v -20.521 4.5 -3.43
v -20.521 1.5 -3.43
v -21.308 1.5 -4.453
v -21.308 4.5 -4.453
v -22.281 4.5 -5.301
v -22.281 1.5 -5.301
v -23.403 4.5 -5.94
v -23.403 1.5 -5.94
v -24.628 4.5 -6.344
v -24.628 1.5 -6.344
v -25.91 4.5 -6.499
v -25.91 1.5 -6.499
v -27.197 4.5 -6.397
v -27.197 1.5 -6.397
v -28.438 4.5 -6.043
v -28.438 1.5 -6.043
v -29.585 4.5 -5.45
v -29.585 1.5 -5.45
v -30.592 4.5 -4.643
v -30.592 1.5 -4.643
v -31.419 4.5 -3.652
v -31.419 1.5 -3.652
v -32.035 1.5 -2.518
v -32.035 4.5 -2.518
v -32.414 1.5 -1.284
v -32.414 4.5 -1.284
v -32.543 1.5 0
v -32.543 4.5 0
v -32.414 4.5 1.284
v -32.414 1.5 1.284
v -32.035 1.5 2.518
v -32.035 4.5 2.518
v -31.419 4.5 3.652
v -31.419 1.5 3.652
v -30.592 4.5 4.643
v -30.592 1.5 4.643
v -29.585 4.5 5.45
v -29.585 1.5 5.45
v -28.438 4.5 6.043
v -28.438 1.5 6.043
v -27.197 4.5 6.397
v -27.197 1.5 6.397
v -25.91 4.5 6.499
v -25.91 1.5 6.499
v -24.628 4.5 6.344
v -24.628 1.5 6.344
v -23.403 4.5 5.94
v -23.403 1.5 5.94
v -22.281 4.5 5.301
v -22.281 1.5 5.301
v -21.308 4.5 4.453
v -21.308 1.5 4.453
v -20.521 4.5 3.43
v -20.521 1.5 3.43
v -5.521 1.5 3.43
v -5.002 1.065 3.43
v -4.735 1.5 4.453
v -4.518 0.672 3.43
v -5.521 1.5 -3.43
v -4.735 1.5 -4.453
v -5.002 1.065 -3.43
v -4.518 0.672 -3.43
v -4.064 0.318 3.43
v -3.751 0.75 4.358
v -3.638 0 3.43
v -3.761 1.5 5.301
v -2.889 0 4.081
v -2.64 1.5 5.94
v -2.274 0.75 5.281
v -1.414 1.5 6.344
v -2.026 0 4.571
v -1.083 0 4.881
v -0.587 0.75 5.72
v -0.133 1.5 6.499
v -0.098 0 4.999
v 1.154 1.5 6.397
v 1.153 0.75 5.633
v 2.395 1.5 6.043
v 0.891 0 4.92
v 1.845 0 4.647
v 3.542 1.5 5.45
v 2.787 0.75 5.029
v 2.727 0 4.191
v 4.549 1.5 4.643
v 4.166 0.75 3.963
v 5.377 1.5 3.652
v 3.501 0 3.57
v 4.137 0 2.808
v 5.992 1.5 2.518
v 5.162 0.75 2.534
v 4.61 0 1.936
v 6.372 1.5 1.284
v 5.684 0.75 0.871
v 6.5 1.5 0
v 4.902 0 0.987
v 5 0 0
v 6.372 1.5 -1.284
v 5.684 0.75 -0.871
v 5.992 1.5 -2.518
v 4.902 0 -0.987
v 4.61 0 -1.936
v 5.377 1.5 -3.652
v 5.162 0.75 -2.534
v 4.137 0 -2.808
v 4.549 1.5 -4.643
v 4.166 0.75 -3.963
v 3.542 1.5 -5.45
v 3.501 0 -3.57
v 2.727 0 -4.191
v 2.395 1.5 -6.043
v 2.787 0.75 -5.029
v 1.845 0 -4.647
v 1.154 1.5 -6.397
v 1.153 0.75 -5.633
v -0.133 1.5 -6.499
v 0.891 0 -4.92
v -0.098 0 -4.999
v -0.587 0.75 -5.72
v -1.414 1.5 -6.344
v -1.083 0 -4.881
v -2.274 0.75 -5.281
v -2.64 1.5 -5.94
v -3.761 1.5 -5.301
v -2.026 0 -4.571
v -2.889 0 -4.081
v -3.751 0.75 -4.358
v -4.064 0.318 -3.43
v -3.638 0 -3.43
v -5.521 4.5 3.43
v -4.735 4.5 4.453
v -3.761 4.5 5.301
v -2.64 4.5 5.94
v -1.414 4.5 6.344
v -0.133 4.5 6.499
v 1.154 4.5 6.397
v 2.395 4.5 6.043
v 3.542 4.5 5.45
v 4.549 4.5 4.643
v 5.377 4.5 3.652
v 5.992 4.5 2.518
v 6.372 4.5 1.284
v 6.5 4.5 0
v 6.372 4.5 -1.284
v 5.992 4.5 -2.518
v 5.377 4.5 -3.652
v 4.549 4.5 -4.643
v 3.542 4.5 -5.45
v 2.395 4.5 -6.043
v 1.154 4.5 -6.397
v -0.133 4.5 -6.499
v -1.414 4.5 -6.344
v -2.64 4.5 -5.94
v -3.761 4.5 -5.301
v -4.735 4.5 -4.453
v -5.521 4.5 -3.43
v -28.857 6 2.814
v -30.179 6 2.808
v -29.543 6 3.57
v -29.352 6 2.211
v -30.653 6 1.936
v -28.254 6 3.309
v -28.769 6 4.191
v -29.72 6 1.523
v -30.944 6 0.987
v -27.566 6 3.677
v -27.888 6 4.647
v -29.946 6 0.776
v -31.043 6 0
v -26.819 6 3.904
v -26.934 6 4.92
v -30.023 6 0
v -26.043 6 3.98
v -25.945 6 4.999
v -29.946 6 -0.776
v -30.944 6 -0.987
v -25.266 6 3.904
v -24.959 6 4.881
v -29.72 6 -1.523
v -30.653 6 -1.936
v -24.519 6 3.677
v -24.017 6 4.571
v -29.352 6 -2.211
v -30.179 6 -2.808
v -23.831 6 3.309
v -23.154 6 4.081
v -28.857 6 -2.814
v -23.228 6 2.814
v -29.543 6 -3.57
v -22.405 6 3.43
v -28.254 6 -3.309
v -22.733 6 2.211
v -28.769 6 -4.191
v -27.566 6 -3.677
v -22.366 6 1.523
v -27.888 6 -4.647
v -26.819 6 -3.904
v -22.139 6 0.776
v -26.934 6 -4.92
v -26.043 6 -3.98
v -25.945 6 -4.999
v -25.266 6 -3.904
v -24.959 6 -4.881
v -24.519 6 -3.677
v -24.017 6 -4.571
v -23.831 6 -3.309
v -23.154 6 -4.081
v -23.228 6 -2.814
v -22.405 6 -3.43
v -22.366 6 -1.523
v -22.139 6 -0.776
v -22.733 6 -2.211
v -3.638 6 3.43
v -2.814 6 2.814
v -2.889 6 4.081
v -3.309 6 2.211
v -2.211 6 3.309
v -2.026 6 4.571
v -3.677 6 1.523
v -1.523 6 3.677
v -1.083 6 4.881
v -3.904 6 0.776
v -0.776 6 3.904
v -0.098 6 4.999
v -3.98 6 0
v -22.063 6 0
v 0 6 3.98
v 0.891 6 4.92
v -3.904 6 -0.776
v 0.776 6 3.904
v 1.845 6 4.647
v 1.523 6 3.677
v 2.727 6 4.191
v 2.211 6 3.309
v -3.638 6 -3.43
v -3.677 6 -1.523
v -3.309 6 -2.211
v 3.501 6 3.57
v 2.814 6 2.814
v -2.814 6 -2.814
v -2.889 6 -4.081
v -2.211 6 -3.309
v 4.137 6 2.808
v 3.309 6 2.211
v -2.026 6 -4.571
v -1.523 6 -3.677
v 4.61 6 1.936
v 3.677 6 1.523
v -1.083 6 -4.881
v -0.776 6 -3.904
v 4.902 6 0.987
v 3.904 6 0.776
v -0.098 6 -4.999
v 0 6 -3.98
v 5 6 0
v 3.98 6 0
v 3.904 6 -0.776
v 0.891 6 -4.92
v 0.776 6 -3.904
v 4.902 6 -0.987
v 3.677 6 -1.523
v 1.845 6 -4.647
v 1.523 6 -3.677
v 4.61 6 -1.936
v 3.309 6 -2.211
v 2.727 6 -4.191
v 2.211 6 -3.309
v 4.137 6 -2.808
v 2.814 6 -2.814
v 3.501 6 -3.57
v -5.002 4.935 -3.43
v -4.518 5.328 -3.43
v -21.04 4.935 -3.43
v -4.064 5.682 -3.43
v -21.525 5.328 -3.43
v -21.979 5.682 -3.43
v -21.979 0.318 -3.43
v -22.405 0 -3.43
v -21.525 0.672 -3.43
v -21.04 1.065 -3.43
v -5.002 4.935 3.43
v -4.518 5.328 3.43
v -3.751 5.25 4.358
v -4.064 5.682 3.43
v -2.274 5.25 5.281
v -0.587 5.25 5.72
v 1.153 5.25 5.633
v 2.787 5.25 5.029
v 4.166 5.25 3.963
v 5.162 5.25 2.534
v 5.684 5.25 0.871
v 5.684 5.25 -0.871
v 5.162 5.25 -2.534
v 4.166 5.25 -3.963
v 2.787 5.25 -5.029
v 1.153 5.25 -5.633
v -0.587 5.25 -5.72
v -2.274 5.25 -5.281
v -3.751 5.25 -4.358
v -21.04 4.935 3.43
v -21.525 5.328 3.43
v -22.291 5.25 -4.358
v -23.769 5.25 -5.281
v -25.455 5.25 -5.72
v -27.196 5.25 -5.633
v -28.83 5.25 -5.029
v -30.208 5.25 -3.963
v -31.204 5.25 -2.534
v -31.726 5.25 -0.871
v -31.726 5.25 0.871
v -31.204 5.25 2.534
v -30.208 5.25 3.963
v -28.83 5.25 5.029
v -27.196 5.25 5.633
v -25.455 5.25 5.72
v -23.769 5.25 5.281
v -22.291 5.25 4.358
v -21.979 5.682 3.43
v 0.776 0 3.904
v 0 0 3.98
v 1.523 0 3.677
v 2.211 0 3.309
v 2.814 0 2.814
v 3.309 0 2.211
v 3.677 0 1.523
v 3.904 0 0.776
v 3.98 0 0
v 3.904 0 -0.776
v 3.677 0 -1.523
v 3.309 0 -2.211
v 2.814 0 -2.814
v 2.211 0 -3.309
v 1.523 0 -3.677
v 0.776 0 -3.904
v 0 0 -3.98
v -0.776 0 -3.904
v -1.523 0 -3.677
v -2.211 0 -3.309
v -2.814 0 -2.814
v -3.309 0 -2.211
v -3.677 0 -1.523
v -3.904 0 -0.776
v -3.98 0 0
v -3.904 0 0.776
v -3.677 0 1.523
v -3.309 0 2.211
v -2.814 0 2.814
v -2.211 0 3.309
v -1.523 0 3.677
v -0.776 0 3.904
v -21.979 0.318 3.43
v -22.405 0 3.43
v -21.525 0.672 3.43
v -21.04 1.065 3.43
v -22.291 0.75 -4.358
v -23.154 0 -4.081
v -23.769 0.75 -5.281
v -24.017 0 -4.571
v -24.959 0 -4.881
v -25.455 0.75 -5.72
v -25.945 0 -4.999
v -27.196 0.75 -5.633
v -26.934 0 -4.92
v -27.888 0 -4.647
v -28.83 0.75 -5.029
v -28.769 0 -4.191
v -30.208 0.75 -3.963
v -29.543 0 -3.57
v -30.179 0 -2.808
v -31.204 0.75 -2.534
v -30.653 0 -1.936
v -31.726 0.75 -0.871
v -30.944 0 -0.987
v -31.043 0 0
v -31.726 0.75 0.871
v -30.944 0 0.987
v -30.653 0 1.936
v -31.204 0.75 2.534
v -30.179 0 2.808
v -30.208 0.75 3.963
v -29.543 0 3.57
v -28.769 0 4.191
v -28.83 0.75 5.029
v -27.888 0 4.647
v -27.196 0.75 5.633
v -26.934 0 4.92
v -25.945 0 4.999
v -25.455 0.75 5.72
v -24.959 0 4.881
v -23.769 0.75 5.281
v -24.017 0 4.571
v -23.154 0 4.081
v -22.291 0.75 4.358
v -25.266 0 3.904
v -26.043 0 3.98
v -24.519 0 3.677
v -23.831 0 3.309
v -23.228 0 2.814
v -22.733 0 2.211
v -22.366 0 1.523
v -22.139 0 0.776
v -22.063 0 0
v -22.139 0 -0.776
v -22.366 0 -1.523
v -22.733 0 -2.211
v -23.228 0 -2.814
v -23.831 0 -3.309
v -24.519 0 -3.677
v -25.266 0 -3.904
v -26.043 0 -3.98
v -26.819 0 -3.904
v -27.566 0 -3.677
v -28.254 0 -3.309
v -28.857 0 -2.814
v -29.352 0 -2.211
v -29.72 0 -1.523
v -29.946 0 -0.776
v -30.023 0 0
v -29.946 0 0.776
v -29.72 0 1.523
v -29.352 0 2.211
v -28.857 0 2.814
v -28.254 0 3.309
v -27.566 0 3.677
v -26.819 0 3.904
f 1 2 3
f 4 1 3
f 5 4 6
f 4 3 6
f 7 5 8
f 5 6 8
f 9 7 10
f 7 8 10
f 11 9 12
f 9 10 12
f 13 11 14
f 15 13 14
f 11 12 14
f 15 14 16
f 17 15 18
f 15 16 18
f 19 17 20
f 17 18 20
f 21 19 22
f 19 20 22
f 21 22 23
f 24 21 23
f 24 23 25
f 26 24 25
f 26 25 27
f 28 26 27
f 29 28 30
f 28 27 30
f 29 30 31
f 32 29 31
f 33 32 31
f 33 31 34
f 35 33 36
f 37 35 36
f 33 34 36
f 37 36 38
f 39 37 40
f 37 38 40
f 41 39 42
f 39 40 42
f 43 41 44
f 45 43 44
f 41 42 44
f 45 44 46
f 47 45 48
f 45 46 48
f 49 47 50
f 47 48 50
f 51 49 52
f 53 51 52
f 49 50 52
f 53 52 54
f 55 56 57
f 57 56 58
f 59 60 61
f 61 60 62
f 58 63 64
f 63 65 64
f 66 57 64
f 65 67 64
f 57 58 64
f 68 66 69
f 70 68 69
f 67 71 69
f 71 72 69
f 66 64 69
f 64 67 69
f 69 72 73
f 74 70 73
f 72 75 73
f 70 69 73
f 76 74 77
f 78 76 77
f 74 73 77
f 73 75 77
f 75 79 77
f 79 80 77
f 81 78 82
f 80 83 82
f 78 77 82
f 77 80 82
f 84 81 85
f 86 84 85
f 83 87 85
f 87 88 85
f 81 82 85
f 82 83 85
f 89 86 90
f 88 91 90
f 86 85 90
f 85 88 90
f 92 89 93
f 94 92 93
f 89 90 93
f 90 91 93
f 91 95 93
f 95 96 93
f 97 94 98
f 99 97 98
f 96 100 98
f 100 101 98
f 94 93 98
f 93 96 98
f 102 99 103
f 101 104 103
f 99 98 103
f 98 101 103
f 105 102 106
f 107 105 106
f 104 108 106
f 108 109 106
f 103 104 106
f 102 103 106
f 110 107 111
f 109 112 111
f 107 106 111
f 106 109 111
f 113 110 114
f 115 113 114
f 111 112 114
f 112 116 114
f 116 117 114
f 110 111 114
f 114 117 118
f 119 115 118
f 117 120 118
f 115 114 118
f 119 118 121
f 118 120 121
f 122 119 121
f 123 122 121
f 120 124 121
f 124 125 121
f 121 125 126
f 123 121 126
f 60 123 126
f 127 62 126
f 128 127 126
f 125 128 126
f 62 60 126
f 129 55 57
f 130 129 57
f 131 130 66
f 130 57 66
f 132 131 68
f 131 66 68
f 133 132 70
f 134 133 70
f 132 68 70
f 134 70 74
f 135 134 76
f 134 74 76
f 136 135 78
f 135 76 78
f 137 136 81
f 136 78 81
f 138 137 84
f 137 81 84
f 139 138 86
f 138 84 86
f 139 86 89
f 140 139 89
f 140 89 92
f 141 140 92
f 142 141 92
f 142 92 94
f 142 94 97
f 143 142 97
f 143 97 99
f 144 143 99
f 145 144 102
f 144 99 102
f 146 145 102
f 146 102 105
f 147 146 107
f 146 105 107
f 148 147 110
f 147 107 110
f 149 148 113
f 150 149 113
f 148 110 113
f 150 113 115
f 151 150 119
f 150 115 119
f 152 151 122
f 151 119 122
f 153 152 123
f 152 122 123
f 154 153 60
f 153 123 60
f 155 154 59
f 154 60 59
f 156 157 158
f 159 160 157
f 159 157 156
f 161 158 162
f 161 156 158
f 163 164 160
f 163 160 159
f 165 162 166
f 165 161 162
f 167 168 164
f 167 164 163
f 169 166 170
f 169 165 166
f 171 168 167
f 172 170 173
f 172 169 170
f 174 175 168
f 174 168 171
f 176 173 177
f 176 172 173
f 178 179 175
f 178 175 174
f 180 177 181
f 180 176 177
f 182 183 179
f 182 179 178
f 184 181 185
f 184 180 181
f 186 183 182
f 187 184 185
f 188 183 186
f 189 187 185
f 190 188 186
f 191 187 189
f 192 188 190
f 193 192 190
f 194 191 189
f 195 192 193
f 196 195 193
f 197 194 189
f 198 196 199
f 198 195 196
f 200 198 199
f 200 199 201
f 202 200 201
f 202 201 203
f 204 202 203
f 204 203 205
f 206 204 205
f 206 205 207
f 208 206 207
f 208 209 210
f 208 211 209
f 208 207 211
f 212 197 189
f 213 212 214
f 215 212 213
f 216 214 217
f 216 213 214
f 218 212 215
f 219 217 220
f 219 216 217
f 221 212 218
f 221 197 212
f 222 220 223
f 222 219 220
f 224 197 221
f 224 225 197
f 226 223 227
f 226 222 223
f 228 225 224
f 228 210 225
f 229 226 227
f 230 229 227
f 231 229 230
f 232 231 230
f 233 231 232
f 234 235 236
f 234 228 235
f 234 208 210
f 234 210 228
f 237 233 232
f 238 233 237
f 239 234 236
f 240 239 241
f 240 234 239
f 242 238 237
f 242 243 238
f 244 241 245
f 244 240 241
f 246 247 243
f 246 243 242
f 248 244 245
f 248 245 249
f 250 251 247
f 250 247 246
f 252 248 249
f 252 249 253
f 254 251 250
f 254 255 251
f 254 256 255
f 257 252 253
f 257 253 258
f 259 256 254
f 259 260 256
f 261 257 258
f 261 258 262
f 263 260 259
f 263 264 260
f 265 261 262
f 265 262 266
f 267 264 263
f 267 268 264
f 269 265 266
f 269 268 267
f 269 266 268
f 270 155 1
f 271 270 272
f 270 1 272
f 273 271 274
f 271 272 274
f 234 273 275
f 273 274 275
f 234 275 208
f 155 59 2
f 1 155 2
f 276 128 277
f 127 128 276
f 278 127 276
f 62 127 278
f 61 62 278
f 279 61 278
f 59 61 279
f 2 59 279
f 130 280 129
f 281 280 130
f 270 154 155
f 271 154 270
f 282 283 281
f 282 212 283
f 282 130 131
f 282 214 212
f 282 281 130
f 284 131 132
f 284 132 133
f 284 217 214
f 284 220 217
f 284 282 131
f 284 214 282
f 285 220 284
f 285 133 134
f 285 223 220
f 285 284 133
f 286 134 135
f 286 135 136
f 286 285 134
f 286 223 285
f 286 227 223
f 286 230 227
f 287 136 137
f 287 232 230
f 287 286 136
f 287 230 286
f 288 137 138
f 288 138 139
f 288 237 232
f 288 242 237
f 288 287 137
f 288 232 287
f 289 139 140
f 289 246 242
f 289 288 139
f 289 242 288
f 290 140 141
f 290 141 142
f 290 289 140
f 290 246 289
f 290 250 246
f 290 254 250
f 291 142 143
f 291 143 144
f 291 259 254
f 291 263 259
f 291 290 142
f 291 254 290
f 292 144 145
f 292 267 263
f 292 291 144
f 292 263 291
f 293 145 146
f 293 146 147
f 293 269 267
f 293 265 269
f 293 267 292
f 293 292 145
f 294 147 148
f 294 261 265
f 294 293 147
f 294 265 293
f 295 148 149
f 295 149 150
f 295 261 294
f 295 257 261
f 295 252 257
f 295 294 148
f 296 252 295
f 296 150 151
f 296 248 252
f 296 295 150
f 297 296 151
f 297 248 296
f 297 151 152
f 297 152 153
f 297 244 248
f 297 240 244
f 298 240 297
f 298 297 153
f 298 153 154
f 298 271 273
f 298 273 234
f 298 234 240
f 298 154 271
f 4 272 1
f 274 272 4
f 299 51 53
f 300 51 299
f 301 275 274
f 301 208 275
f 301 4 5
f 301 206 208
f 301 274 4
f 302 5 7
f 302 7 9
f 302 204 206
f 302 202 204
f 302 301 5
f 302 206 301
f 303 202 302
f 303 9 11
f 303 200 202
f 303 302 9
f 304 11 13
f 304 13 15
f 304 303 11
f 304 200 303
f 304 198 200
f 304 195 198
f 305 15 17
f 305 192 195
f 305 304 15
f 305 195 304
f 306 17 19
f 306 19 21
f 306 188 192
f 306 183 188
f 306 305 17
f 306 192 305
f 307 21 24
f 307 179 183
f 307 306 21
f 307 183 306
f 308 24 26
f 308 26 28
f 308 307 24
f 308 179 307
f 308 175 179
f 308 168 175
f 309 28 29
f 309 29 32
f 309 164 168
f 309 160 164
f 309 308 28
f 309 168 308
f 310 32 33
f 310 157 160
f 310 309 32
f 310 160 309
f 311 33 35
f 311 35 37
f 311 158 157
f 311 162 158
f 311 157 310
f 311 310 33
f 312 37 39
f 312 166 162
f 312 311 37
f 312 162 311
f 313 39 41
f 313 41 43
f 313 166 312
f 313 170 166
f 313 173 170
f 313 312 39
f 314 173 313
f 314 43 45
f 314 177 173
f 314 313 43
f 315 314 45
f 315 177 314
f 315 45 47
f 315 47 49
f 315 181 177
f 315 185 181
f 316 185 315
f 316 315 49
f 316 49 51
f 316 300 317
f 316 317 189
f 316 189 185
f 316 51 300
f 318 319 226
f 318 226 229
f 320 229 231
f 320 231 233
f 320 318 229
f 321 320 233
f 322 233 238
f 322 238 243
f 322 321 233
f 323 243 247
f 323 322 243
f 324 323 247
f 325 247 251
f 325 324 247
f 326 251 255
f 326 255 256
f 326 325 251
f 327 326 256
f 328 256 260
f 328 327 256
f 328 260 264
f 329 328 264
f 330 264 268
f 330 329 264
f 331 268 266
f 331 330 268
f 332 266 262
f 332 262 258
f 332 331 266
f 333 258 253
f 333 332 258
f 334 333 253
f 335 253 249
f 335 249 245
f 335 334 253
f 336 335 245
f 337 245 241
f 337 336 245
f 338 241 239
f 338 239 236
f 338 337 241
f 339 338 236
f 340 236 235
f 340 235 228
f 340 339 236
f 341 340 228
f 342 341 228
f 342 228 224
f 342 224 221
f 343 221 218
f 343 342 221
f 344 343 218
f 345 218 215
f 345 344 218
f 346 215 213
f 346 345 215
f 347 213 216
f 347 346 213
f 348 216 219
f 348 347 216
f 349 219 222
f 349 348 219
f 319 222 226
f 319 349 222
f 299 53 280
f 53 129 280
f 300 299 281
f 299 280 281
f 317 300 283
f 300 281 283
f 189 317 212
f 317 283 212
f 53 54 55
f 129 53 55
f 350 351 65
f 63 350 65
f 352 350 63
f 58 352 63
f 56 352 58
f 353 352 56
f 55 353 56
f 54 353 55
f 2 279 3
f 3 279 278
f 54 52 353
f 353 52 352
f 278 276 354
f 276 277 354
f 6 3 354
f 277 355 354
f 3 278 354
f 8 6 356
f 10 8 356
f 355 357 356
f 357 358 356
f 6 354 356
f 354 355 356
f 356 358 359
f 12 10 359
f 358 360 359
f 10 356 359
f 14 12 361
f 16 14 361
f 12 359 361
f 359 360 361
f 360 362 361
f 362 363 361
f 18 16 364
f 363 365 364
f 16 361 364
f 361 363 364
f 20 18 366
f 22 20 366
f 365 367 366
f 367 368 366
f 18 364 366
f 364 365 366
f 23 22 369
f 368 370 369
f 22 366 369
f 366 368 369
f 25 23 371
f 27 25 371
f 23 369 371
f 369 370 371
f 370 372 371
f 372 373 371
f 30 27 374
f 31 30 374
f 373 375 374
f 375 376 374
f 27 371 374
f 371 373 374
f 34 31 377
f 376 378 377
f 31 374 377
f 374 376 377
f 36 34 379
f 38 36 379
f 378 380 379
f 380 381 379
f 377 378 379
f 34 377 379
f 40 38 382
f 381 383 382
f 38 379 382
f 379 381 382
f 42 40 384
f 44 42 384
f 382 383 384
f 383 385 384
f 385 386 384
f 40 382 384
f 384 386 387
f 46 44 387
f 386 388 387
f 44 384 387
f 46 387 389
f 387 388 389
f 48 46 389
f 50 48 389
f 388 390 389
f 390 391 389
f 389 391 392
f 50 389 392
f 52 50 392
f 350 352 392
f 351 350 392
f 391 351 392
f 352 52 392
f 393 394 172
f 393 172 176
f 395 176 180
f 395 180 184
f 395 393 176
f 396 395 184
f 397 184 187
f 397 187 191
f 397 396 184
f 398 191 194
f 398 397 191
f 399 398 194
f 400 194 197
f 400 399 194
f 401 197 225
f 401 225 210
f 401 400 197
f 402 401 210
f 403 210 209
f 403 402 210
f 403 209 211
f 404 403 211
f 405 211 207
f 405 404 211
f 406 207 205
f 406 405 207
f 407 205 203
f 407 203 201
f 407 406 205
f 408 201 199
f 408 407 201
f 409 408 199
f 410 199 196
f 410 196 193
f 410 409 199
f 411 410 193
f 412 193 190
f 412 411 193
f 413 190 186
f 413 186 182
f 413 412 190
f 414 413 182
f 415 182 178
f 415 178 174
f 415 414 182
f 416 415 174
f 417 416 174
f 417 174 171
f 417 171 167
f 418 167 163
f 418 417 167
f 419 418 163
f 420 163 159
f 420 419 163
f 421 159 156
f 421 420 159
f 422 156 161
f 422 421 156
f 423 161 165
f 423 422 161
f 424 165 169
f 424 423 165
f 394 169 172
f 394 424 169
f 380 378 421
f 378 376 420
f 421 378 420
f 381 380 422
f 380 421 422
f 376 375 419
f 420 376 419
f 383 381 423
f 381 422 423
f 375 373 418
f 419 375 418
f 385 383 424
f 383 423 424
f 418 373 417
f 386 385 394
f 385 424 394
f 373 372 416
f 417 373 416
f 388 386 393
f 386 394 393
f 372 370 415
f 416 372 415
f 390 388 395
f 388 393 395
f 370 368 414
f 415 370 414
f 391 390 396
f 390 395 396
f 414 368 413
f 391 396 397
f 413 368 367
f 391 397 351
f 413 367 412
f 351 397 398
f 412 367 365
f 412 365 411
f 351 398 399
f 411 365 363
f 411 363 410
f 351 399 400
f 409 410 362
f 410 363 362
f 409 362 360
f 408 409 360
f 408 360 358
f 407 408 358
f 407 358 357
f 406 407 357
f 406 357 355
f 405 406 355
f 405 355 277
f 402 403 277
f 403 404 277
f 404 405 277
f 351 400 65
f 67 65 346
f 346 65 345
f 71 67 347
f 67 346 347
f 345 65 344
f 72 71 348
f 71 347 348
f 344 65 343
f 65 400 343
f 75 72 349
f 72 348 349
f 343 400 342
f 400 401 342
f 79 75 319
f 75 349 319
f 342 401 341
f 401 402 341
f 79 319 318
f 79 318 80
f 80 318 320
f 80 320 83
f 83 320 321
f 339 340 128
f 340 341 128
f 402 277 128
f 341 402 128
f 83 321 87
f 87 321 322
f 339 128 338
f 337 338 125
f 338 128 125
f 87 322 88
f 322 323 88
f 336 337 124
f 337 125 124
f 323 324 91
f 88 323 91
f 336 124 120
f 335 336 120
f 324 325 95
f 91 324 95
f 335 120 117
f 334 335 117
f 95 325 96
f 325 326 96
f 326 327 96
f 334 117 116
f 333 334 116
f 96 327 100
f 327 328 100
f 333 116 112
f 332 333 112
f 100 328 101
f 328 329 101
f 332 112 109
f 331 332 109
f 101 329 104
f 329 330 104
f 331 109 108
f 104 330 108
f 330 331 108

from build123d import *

# Parameters (mm, degrees)
SKETCH1_R           = 3.98
BOSS_EXTRUDE1_DEPTH = 6
CHAMFER1_SIZE       = 1.5


with BuildPart() as part:
    # Sketch1 → Boss-Extrude1 (new body)
    with BuildSketch(Plane(origin=(0, 0, 0), x_dir=(1, 0, 0), z_dir=(0, 1, 0))):
        with BuildLine():
            Line((-5.521270529, 3.430097921), (-20.521270529, 3.430097921))
            ThreePointArc((-20.521270529, 3.430097921), (-32.542541057, 0), (-20.521270529, -3.430097921))
            Line((-20.521270529, -3.430097921), (-5.521270529, -3.430097921))
            ThreePointArc((-5.521270529, -3.430097921), (6.5, 0), (-5.521270529, 3.430097921))
        make_face()
        with Locations(Location((-26.042541057, 0, 0), (0, 0, 270))):
            Circle(SKETCH1_R, mode=Mode.SUBTRACT)
        with Locations(Location((0, 0, 0), (0, 0, 270))):
            Circle(SKETCH1_R, mode=Mode.SUBTRACT)
    extrude(amount=BOSS_EXTRUDE1_DEPTH)

    # Chamfer1
    chamfer1_edges = [part.edges().sort_by_distance(p)[0] for p in [
        (-32.542541057, 0, 0),
        (-32.542541057, 6, 0),
        (6.5, 6, 0),
        (6.5, 0, 0),
    ]]
    chamfer(chamfer1_edges, length=CHAMFER1_SIZE)


solid = part.part
